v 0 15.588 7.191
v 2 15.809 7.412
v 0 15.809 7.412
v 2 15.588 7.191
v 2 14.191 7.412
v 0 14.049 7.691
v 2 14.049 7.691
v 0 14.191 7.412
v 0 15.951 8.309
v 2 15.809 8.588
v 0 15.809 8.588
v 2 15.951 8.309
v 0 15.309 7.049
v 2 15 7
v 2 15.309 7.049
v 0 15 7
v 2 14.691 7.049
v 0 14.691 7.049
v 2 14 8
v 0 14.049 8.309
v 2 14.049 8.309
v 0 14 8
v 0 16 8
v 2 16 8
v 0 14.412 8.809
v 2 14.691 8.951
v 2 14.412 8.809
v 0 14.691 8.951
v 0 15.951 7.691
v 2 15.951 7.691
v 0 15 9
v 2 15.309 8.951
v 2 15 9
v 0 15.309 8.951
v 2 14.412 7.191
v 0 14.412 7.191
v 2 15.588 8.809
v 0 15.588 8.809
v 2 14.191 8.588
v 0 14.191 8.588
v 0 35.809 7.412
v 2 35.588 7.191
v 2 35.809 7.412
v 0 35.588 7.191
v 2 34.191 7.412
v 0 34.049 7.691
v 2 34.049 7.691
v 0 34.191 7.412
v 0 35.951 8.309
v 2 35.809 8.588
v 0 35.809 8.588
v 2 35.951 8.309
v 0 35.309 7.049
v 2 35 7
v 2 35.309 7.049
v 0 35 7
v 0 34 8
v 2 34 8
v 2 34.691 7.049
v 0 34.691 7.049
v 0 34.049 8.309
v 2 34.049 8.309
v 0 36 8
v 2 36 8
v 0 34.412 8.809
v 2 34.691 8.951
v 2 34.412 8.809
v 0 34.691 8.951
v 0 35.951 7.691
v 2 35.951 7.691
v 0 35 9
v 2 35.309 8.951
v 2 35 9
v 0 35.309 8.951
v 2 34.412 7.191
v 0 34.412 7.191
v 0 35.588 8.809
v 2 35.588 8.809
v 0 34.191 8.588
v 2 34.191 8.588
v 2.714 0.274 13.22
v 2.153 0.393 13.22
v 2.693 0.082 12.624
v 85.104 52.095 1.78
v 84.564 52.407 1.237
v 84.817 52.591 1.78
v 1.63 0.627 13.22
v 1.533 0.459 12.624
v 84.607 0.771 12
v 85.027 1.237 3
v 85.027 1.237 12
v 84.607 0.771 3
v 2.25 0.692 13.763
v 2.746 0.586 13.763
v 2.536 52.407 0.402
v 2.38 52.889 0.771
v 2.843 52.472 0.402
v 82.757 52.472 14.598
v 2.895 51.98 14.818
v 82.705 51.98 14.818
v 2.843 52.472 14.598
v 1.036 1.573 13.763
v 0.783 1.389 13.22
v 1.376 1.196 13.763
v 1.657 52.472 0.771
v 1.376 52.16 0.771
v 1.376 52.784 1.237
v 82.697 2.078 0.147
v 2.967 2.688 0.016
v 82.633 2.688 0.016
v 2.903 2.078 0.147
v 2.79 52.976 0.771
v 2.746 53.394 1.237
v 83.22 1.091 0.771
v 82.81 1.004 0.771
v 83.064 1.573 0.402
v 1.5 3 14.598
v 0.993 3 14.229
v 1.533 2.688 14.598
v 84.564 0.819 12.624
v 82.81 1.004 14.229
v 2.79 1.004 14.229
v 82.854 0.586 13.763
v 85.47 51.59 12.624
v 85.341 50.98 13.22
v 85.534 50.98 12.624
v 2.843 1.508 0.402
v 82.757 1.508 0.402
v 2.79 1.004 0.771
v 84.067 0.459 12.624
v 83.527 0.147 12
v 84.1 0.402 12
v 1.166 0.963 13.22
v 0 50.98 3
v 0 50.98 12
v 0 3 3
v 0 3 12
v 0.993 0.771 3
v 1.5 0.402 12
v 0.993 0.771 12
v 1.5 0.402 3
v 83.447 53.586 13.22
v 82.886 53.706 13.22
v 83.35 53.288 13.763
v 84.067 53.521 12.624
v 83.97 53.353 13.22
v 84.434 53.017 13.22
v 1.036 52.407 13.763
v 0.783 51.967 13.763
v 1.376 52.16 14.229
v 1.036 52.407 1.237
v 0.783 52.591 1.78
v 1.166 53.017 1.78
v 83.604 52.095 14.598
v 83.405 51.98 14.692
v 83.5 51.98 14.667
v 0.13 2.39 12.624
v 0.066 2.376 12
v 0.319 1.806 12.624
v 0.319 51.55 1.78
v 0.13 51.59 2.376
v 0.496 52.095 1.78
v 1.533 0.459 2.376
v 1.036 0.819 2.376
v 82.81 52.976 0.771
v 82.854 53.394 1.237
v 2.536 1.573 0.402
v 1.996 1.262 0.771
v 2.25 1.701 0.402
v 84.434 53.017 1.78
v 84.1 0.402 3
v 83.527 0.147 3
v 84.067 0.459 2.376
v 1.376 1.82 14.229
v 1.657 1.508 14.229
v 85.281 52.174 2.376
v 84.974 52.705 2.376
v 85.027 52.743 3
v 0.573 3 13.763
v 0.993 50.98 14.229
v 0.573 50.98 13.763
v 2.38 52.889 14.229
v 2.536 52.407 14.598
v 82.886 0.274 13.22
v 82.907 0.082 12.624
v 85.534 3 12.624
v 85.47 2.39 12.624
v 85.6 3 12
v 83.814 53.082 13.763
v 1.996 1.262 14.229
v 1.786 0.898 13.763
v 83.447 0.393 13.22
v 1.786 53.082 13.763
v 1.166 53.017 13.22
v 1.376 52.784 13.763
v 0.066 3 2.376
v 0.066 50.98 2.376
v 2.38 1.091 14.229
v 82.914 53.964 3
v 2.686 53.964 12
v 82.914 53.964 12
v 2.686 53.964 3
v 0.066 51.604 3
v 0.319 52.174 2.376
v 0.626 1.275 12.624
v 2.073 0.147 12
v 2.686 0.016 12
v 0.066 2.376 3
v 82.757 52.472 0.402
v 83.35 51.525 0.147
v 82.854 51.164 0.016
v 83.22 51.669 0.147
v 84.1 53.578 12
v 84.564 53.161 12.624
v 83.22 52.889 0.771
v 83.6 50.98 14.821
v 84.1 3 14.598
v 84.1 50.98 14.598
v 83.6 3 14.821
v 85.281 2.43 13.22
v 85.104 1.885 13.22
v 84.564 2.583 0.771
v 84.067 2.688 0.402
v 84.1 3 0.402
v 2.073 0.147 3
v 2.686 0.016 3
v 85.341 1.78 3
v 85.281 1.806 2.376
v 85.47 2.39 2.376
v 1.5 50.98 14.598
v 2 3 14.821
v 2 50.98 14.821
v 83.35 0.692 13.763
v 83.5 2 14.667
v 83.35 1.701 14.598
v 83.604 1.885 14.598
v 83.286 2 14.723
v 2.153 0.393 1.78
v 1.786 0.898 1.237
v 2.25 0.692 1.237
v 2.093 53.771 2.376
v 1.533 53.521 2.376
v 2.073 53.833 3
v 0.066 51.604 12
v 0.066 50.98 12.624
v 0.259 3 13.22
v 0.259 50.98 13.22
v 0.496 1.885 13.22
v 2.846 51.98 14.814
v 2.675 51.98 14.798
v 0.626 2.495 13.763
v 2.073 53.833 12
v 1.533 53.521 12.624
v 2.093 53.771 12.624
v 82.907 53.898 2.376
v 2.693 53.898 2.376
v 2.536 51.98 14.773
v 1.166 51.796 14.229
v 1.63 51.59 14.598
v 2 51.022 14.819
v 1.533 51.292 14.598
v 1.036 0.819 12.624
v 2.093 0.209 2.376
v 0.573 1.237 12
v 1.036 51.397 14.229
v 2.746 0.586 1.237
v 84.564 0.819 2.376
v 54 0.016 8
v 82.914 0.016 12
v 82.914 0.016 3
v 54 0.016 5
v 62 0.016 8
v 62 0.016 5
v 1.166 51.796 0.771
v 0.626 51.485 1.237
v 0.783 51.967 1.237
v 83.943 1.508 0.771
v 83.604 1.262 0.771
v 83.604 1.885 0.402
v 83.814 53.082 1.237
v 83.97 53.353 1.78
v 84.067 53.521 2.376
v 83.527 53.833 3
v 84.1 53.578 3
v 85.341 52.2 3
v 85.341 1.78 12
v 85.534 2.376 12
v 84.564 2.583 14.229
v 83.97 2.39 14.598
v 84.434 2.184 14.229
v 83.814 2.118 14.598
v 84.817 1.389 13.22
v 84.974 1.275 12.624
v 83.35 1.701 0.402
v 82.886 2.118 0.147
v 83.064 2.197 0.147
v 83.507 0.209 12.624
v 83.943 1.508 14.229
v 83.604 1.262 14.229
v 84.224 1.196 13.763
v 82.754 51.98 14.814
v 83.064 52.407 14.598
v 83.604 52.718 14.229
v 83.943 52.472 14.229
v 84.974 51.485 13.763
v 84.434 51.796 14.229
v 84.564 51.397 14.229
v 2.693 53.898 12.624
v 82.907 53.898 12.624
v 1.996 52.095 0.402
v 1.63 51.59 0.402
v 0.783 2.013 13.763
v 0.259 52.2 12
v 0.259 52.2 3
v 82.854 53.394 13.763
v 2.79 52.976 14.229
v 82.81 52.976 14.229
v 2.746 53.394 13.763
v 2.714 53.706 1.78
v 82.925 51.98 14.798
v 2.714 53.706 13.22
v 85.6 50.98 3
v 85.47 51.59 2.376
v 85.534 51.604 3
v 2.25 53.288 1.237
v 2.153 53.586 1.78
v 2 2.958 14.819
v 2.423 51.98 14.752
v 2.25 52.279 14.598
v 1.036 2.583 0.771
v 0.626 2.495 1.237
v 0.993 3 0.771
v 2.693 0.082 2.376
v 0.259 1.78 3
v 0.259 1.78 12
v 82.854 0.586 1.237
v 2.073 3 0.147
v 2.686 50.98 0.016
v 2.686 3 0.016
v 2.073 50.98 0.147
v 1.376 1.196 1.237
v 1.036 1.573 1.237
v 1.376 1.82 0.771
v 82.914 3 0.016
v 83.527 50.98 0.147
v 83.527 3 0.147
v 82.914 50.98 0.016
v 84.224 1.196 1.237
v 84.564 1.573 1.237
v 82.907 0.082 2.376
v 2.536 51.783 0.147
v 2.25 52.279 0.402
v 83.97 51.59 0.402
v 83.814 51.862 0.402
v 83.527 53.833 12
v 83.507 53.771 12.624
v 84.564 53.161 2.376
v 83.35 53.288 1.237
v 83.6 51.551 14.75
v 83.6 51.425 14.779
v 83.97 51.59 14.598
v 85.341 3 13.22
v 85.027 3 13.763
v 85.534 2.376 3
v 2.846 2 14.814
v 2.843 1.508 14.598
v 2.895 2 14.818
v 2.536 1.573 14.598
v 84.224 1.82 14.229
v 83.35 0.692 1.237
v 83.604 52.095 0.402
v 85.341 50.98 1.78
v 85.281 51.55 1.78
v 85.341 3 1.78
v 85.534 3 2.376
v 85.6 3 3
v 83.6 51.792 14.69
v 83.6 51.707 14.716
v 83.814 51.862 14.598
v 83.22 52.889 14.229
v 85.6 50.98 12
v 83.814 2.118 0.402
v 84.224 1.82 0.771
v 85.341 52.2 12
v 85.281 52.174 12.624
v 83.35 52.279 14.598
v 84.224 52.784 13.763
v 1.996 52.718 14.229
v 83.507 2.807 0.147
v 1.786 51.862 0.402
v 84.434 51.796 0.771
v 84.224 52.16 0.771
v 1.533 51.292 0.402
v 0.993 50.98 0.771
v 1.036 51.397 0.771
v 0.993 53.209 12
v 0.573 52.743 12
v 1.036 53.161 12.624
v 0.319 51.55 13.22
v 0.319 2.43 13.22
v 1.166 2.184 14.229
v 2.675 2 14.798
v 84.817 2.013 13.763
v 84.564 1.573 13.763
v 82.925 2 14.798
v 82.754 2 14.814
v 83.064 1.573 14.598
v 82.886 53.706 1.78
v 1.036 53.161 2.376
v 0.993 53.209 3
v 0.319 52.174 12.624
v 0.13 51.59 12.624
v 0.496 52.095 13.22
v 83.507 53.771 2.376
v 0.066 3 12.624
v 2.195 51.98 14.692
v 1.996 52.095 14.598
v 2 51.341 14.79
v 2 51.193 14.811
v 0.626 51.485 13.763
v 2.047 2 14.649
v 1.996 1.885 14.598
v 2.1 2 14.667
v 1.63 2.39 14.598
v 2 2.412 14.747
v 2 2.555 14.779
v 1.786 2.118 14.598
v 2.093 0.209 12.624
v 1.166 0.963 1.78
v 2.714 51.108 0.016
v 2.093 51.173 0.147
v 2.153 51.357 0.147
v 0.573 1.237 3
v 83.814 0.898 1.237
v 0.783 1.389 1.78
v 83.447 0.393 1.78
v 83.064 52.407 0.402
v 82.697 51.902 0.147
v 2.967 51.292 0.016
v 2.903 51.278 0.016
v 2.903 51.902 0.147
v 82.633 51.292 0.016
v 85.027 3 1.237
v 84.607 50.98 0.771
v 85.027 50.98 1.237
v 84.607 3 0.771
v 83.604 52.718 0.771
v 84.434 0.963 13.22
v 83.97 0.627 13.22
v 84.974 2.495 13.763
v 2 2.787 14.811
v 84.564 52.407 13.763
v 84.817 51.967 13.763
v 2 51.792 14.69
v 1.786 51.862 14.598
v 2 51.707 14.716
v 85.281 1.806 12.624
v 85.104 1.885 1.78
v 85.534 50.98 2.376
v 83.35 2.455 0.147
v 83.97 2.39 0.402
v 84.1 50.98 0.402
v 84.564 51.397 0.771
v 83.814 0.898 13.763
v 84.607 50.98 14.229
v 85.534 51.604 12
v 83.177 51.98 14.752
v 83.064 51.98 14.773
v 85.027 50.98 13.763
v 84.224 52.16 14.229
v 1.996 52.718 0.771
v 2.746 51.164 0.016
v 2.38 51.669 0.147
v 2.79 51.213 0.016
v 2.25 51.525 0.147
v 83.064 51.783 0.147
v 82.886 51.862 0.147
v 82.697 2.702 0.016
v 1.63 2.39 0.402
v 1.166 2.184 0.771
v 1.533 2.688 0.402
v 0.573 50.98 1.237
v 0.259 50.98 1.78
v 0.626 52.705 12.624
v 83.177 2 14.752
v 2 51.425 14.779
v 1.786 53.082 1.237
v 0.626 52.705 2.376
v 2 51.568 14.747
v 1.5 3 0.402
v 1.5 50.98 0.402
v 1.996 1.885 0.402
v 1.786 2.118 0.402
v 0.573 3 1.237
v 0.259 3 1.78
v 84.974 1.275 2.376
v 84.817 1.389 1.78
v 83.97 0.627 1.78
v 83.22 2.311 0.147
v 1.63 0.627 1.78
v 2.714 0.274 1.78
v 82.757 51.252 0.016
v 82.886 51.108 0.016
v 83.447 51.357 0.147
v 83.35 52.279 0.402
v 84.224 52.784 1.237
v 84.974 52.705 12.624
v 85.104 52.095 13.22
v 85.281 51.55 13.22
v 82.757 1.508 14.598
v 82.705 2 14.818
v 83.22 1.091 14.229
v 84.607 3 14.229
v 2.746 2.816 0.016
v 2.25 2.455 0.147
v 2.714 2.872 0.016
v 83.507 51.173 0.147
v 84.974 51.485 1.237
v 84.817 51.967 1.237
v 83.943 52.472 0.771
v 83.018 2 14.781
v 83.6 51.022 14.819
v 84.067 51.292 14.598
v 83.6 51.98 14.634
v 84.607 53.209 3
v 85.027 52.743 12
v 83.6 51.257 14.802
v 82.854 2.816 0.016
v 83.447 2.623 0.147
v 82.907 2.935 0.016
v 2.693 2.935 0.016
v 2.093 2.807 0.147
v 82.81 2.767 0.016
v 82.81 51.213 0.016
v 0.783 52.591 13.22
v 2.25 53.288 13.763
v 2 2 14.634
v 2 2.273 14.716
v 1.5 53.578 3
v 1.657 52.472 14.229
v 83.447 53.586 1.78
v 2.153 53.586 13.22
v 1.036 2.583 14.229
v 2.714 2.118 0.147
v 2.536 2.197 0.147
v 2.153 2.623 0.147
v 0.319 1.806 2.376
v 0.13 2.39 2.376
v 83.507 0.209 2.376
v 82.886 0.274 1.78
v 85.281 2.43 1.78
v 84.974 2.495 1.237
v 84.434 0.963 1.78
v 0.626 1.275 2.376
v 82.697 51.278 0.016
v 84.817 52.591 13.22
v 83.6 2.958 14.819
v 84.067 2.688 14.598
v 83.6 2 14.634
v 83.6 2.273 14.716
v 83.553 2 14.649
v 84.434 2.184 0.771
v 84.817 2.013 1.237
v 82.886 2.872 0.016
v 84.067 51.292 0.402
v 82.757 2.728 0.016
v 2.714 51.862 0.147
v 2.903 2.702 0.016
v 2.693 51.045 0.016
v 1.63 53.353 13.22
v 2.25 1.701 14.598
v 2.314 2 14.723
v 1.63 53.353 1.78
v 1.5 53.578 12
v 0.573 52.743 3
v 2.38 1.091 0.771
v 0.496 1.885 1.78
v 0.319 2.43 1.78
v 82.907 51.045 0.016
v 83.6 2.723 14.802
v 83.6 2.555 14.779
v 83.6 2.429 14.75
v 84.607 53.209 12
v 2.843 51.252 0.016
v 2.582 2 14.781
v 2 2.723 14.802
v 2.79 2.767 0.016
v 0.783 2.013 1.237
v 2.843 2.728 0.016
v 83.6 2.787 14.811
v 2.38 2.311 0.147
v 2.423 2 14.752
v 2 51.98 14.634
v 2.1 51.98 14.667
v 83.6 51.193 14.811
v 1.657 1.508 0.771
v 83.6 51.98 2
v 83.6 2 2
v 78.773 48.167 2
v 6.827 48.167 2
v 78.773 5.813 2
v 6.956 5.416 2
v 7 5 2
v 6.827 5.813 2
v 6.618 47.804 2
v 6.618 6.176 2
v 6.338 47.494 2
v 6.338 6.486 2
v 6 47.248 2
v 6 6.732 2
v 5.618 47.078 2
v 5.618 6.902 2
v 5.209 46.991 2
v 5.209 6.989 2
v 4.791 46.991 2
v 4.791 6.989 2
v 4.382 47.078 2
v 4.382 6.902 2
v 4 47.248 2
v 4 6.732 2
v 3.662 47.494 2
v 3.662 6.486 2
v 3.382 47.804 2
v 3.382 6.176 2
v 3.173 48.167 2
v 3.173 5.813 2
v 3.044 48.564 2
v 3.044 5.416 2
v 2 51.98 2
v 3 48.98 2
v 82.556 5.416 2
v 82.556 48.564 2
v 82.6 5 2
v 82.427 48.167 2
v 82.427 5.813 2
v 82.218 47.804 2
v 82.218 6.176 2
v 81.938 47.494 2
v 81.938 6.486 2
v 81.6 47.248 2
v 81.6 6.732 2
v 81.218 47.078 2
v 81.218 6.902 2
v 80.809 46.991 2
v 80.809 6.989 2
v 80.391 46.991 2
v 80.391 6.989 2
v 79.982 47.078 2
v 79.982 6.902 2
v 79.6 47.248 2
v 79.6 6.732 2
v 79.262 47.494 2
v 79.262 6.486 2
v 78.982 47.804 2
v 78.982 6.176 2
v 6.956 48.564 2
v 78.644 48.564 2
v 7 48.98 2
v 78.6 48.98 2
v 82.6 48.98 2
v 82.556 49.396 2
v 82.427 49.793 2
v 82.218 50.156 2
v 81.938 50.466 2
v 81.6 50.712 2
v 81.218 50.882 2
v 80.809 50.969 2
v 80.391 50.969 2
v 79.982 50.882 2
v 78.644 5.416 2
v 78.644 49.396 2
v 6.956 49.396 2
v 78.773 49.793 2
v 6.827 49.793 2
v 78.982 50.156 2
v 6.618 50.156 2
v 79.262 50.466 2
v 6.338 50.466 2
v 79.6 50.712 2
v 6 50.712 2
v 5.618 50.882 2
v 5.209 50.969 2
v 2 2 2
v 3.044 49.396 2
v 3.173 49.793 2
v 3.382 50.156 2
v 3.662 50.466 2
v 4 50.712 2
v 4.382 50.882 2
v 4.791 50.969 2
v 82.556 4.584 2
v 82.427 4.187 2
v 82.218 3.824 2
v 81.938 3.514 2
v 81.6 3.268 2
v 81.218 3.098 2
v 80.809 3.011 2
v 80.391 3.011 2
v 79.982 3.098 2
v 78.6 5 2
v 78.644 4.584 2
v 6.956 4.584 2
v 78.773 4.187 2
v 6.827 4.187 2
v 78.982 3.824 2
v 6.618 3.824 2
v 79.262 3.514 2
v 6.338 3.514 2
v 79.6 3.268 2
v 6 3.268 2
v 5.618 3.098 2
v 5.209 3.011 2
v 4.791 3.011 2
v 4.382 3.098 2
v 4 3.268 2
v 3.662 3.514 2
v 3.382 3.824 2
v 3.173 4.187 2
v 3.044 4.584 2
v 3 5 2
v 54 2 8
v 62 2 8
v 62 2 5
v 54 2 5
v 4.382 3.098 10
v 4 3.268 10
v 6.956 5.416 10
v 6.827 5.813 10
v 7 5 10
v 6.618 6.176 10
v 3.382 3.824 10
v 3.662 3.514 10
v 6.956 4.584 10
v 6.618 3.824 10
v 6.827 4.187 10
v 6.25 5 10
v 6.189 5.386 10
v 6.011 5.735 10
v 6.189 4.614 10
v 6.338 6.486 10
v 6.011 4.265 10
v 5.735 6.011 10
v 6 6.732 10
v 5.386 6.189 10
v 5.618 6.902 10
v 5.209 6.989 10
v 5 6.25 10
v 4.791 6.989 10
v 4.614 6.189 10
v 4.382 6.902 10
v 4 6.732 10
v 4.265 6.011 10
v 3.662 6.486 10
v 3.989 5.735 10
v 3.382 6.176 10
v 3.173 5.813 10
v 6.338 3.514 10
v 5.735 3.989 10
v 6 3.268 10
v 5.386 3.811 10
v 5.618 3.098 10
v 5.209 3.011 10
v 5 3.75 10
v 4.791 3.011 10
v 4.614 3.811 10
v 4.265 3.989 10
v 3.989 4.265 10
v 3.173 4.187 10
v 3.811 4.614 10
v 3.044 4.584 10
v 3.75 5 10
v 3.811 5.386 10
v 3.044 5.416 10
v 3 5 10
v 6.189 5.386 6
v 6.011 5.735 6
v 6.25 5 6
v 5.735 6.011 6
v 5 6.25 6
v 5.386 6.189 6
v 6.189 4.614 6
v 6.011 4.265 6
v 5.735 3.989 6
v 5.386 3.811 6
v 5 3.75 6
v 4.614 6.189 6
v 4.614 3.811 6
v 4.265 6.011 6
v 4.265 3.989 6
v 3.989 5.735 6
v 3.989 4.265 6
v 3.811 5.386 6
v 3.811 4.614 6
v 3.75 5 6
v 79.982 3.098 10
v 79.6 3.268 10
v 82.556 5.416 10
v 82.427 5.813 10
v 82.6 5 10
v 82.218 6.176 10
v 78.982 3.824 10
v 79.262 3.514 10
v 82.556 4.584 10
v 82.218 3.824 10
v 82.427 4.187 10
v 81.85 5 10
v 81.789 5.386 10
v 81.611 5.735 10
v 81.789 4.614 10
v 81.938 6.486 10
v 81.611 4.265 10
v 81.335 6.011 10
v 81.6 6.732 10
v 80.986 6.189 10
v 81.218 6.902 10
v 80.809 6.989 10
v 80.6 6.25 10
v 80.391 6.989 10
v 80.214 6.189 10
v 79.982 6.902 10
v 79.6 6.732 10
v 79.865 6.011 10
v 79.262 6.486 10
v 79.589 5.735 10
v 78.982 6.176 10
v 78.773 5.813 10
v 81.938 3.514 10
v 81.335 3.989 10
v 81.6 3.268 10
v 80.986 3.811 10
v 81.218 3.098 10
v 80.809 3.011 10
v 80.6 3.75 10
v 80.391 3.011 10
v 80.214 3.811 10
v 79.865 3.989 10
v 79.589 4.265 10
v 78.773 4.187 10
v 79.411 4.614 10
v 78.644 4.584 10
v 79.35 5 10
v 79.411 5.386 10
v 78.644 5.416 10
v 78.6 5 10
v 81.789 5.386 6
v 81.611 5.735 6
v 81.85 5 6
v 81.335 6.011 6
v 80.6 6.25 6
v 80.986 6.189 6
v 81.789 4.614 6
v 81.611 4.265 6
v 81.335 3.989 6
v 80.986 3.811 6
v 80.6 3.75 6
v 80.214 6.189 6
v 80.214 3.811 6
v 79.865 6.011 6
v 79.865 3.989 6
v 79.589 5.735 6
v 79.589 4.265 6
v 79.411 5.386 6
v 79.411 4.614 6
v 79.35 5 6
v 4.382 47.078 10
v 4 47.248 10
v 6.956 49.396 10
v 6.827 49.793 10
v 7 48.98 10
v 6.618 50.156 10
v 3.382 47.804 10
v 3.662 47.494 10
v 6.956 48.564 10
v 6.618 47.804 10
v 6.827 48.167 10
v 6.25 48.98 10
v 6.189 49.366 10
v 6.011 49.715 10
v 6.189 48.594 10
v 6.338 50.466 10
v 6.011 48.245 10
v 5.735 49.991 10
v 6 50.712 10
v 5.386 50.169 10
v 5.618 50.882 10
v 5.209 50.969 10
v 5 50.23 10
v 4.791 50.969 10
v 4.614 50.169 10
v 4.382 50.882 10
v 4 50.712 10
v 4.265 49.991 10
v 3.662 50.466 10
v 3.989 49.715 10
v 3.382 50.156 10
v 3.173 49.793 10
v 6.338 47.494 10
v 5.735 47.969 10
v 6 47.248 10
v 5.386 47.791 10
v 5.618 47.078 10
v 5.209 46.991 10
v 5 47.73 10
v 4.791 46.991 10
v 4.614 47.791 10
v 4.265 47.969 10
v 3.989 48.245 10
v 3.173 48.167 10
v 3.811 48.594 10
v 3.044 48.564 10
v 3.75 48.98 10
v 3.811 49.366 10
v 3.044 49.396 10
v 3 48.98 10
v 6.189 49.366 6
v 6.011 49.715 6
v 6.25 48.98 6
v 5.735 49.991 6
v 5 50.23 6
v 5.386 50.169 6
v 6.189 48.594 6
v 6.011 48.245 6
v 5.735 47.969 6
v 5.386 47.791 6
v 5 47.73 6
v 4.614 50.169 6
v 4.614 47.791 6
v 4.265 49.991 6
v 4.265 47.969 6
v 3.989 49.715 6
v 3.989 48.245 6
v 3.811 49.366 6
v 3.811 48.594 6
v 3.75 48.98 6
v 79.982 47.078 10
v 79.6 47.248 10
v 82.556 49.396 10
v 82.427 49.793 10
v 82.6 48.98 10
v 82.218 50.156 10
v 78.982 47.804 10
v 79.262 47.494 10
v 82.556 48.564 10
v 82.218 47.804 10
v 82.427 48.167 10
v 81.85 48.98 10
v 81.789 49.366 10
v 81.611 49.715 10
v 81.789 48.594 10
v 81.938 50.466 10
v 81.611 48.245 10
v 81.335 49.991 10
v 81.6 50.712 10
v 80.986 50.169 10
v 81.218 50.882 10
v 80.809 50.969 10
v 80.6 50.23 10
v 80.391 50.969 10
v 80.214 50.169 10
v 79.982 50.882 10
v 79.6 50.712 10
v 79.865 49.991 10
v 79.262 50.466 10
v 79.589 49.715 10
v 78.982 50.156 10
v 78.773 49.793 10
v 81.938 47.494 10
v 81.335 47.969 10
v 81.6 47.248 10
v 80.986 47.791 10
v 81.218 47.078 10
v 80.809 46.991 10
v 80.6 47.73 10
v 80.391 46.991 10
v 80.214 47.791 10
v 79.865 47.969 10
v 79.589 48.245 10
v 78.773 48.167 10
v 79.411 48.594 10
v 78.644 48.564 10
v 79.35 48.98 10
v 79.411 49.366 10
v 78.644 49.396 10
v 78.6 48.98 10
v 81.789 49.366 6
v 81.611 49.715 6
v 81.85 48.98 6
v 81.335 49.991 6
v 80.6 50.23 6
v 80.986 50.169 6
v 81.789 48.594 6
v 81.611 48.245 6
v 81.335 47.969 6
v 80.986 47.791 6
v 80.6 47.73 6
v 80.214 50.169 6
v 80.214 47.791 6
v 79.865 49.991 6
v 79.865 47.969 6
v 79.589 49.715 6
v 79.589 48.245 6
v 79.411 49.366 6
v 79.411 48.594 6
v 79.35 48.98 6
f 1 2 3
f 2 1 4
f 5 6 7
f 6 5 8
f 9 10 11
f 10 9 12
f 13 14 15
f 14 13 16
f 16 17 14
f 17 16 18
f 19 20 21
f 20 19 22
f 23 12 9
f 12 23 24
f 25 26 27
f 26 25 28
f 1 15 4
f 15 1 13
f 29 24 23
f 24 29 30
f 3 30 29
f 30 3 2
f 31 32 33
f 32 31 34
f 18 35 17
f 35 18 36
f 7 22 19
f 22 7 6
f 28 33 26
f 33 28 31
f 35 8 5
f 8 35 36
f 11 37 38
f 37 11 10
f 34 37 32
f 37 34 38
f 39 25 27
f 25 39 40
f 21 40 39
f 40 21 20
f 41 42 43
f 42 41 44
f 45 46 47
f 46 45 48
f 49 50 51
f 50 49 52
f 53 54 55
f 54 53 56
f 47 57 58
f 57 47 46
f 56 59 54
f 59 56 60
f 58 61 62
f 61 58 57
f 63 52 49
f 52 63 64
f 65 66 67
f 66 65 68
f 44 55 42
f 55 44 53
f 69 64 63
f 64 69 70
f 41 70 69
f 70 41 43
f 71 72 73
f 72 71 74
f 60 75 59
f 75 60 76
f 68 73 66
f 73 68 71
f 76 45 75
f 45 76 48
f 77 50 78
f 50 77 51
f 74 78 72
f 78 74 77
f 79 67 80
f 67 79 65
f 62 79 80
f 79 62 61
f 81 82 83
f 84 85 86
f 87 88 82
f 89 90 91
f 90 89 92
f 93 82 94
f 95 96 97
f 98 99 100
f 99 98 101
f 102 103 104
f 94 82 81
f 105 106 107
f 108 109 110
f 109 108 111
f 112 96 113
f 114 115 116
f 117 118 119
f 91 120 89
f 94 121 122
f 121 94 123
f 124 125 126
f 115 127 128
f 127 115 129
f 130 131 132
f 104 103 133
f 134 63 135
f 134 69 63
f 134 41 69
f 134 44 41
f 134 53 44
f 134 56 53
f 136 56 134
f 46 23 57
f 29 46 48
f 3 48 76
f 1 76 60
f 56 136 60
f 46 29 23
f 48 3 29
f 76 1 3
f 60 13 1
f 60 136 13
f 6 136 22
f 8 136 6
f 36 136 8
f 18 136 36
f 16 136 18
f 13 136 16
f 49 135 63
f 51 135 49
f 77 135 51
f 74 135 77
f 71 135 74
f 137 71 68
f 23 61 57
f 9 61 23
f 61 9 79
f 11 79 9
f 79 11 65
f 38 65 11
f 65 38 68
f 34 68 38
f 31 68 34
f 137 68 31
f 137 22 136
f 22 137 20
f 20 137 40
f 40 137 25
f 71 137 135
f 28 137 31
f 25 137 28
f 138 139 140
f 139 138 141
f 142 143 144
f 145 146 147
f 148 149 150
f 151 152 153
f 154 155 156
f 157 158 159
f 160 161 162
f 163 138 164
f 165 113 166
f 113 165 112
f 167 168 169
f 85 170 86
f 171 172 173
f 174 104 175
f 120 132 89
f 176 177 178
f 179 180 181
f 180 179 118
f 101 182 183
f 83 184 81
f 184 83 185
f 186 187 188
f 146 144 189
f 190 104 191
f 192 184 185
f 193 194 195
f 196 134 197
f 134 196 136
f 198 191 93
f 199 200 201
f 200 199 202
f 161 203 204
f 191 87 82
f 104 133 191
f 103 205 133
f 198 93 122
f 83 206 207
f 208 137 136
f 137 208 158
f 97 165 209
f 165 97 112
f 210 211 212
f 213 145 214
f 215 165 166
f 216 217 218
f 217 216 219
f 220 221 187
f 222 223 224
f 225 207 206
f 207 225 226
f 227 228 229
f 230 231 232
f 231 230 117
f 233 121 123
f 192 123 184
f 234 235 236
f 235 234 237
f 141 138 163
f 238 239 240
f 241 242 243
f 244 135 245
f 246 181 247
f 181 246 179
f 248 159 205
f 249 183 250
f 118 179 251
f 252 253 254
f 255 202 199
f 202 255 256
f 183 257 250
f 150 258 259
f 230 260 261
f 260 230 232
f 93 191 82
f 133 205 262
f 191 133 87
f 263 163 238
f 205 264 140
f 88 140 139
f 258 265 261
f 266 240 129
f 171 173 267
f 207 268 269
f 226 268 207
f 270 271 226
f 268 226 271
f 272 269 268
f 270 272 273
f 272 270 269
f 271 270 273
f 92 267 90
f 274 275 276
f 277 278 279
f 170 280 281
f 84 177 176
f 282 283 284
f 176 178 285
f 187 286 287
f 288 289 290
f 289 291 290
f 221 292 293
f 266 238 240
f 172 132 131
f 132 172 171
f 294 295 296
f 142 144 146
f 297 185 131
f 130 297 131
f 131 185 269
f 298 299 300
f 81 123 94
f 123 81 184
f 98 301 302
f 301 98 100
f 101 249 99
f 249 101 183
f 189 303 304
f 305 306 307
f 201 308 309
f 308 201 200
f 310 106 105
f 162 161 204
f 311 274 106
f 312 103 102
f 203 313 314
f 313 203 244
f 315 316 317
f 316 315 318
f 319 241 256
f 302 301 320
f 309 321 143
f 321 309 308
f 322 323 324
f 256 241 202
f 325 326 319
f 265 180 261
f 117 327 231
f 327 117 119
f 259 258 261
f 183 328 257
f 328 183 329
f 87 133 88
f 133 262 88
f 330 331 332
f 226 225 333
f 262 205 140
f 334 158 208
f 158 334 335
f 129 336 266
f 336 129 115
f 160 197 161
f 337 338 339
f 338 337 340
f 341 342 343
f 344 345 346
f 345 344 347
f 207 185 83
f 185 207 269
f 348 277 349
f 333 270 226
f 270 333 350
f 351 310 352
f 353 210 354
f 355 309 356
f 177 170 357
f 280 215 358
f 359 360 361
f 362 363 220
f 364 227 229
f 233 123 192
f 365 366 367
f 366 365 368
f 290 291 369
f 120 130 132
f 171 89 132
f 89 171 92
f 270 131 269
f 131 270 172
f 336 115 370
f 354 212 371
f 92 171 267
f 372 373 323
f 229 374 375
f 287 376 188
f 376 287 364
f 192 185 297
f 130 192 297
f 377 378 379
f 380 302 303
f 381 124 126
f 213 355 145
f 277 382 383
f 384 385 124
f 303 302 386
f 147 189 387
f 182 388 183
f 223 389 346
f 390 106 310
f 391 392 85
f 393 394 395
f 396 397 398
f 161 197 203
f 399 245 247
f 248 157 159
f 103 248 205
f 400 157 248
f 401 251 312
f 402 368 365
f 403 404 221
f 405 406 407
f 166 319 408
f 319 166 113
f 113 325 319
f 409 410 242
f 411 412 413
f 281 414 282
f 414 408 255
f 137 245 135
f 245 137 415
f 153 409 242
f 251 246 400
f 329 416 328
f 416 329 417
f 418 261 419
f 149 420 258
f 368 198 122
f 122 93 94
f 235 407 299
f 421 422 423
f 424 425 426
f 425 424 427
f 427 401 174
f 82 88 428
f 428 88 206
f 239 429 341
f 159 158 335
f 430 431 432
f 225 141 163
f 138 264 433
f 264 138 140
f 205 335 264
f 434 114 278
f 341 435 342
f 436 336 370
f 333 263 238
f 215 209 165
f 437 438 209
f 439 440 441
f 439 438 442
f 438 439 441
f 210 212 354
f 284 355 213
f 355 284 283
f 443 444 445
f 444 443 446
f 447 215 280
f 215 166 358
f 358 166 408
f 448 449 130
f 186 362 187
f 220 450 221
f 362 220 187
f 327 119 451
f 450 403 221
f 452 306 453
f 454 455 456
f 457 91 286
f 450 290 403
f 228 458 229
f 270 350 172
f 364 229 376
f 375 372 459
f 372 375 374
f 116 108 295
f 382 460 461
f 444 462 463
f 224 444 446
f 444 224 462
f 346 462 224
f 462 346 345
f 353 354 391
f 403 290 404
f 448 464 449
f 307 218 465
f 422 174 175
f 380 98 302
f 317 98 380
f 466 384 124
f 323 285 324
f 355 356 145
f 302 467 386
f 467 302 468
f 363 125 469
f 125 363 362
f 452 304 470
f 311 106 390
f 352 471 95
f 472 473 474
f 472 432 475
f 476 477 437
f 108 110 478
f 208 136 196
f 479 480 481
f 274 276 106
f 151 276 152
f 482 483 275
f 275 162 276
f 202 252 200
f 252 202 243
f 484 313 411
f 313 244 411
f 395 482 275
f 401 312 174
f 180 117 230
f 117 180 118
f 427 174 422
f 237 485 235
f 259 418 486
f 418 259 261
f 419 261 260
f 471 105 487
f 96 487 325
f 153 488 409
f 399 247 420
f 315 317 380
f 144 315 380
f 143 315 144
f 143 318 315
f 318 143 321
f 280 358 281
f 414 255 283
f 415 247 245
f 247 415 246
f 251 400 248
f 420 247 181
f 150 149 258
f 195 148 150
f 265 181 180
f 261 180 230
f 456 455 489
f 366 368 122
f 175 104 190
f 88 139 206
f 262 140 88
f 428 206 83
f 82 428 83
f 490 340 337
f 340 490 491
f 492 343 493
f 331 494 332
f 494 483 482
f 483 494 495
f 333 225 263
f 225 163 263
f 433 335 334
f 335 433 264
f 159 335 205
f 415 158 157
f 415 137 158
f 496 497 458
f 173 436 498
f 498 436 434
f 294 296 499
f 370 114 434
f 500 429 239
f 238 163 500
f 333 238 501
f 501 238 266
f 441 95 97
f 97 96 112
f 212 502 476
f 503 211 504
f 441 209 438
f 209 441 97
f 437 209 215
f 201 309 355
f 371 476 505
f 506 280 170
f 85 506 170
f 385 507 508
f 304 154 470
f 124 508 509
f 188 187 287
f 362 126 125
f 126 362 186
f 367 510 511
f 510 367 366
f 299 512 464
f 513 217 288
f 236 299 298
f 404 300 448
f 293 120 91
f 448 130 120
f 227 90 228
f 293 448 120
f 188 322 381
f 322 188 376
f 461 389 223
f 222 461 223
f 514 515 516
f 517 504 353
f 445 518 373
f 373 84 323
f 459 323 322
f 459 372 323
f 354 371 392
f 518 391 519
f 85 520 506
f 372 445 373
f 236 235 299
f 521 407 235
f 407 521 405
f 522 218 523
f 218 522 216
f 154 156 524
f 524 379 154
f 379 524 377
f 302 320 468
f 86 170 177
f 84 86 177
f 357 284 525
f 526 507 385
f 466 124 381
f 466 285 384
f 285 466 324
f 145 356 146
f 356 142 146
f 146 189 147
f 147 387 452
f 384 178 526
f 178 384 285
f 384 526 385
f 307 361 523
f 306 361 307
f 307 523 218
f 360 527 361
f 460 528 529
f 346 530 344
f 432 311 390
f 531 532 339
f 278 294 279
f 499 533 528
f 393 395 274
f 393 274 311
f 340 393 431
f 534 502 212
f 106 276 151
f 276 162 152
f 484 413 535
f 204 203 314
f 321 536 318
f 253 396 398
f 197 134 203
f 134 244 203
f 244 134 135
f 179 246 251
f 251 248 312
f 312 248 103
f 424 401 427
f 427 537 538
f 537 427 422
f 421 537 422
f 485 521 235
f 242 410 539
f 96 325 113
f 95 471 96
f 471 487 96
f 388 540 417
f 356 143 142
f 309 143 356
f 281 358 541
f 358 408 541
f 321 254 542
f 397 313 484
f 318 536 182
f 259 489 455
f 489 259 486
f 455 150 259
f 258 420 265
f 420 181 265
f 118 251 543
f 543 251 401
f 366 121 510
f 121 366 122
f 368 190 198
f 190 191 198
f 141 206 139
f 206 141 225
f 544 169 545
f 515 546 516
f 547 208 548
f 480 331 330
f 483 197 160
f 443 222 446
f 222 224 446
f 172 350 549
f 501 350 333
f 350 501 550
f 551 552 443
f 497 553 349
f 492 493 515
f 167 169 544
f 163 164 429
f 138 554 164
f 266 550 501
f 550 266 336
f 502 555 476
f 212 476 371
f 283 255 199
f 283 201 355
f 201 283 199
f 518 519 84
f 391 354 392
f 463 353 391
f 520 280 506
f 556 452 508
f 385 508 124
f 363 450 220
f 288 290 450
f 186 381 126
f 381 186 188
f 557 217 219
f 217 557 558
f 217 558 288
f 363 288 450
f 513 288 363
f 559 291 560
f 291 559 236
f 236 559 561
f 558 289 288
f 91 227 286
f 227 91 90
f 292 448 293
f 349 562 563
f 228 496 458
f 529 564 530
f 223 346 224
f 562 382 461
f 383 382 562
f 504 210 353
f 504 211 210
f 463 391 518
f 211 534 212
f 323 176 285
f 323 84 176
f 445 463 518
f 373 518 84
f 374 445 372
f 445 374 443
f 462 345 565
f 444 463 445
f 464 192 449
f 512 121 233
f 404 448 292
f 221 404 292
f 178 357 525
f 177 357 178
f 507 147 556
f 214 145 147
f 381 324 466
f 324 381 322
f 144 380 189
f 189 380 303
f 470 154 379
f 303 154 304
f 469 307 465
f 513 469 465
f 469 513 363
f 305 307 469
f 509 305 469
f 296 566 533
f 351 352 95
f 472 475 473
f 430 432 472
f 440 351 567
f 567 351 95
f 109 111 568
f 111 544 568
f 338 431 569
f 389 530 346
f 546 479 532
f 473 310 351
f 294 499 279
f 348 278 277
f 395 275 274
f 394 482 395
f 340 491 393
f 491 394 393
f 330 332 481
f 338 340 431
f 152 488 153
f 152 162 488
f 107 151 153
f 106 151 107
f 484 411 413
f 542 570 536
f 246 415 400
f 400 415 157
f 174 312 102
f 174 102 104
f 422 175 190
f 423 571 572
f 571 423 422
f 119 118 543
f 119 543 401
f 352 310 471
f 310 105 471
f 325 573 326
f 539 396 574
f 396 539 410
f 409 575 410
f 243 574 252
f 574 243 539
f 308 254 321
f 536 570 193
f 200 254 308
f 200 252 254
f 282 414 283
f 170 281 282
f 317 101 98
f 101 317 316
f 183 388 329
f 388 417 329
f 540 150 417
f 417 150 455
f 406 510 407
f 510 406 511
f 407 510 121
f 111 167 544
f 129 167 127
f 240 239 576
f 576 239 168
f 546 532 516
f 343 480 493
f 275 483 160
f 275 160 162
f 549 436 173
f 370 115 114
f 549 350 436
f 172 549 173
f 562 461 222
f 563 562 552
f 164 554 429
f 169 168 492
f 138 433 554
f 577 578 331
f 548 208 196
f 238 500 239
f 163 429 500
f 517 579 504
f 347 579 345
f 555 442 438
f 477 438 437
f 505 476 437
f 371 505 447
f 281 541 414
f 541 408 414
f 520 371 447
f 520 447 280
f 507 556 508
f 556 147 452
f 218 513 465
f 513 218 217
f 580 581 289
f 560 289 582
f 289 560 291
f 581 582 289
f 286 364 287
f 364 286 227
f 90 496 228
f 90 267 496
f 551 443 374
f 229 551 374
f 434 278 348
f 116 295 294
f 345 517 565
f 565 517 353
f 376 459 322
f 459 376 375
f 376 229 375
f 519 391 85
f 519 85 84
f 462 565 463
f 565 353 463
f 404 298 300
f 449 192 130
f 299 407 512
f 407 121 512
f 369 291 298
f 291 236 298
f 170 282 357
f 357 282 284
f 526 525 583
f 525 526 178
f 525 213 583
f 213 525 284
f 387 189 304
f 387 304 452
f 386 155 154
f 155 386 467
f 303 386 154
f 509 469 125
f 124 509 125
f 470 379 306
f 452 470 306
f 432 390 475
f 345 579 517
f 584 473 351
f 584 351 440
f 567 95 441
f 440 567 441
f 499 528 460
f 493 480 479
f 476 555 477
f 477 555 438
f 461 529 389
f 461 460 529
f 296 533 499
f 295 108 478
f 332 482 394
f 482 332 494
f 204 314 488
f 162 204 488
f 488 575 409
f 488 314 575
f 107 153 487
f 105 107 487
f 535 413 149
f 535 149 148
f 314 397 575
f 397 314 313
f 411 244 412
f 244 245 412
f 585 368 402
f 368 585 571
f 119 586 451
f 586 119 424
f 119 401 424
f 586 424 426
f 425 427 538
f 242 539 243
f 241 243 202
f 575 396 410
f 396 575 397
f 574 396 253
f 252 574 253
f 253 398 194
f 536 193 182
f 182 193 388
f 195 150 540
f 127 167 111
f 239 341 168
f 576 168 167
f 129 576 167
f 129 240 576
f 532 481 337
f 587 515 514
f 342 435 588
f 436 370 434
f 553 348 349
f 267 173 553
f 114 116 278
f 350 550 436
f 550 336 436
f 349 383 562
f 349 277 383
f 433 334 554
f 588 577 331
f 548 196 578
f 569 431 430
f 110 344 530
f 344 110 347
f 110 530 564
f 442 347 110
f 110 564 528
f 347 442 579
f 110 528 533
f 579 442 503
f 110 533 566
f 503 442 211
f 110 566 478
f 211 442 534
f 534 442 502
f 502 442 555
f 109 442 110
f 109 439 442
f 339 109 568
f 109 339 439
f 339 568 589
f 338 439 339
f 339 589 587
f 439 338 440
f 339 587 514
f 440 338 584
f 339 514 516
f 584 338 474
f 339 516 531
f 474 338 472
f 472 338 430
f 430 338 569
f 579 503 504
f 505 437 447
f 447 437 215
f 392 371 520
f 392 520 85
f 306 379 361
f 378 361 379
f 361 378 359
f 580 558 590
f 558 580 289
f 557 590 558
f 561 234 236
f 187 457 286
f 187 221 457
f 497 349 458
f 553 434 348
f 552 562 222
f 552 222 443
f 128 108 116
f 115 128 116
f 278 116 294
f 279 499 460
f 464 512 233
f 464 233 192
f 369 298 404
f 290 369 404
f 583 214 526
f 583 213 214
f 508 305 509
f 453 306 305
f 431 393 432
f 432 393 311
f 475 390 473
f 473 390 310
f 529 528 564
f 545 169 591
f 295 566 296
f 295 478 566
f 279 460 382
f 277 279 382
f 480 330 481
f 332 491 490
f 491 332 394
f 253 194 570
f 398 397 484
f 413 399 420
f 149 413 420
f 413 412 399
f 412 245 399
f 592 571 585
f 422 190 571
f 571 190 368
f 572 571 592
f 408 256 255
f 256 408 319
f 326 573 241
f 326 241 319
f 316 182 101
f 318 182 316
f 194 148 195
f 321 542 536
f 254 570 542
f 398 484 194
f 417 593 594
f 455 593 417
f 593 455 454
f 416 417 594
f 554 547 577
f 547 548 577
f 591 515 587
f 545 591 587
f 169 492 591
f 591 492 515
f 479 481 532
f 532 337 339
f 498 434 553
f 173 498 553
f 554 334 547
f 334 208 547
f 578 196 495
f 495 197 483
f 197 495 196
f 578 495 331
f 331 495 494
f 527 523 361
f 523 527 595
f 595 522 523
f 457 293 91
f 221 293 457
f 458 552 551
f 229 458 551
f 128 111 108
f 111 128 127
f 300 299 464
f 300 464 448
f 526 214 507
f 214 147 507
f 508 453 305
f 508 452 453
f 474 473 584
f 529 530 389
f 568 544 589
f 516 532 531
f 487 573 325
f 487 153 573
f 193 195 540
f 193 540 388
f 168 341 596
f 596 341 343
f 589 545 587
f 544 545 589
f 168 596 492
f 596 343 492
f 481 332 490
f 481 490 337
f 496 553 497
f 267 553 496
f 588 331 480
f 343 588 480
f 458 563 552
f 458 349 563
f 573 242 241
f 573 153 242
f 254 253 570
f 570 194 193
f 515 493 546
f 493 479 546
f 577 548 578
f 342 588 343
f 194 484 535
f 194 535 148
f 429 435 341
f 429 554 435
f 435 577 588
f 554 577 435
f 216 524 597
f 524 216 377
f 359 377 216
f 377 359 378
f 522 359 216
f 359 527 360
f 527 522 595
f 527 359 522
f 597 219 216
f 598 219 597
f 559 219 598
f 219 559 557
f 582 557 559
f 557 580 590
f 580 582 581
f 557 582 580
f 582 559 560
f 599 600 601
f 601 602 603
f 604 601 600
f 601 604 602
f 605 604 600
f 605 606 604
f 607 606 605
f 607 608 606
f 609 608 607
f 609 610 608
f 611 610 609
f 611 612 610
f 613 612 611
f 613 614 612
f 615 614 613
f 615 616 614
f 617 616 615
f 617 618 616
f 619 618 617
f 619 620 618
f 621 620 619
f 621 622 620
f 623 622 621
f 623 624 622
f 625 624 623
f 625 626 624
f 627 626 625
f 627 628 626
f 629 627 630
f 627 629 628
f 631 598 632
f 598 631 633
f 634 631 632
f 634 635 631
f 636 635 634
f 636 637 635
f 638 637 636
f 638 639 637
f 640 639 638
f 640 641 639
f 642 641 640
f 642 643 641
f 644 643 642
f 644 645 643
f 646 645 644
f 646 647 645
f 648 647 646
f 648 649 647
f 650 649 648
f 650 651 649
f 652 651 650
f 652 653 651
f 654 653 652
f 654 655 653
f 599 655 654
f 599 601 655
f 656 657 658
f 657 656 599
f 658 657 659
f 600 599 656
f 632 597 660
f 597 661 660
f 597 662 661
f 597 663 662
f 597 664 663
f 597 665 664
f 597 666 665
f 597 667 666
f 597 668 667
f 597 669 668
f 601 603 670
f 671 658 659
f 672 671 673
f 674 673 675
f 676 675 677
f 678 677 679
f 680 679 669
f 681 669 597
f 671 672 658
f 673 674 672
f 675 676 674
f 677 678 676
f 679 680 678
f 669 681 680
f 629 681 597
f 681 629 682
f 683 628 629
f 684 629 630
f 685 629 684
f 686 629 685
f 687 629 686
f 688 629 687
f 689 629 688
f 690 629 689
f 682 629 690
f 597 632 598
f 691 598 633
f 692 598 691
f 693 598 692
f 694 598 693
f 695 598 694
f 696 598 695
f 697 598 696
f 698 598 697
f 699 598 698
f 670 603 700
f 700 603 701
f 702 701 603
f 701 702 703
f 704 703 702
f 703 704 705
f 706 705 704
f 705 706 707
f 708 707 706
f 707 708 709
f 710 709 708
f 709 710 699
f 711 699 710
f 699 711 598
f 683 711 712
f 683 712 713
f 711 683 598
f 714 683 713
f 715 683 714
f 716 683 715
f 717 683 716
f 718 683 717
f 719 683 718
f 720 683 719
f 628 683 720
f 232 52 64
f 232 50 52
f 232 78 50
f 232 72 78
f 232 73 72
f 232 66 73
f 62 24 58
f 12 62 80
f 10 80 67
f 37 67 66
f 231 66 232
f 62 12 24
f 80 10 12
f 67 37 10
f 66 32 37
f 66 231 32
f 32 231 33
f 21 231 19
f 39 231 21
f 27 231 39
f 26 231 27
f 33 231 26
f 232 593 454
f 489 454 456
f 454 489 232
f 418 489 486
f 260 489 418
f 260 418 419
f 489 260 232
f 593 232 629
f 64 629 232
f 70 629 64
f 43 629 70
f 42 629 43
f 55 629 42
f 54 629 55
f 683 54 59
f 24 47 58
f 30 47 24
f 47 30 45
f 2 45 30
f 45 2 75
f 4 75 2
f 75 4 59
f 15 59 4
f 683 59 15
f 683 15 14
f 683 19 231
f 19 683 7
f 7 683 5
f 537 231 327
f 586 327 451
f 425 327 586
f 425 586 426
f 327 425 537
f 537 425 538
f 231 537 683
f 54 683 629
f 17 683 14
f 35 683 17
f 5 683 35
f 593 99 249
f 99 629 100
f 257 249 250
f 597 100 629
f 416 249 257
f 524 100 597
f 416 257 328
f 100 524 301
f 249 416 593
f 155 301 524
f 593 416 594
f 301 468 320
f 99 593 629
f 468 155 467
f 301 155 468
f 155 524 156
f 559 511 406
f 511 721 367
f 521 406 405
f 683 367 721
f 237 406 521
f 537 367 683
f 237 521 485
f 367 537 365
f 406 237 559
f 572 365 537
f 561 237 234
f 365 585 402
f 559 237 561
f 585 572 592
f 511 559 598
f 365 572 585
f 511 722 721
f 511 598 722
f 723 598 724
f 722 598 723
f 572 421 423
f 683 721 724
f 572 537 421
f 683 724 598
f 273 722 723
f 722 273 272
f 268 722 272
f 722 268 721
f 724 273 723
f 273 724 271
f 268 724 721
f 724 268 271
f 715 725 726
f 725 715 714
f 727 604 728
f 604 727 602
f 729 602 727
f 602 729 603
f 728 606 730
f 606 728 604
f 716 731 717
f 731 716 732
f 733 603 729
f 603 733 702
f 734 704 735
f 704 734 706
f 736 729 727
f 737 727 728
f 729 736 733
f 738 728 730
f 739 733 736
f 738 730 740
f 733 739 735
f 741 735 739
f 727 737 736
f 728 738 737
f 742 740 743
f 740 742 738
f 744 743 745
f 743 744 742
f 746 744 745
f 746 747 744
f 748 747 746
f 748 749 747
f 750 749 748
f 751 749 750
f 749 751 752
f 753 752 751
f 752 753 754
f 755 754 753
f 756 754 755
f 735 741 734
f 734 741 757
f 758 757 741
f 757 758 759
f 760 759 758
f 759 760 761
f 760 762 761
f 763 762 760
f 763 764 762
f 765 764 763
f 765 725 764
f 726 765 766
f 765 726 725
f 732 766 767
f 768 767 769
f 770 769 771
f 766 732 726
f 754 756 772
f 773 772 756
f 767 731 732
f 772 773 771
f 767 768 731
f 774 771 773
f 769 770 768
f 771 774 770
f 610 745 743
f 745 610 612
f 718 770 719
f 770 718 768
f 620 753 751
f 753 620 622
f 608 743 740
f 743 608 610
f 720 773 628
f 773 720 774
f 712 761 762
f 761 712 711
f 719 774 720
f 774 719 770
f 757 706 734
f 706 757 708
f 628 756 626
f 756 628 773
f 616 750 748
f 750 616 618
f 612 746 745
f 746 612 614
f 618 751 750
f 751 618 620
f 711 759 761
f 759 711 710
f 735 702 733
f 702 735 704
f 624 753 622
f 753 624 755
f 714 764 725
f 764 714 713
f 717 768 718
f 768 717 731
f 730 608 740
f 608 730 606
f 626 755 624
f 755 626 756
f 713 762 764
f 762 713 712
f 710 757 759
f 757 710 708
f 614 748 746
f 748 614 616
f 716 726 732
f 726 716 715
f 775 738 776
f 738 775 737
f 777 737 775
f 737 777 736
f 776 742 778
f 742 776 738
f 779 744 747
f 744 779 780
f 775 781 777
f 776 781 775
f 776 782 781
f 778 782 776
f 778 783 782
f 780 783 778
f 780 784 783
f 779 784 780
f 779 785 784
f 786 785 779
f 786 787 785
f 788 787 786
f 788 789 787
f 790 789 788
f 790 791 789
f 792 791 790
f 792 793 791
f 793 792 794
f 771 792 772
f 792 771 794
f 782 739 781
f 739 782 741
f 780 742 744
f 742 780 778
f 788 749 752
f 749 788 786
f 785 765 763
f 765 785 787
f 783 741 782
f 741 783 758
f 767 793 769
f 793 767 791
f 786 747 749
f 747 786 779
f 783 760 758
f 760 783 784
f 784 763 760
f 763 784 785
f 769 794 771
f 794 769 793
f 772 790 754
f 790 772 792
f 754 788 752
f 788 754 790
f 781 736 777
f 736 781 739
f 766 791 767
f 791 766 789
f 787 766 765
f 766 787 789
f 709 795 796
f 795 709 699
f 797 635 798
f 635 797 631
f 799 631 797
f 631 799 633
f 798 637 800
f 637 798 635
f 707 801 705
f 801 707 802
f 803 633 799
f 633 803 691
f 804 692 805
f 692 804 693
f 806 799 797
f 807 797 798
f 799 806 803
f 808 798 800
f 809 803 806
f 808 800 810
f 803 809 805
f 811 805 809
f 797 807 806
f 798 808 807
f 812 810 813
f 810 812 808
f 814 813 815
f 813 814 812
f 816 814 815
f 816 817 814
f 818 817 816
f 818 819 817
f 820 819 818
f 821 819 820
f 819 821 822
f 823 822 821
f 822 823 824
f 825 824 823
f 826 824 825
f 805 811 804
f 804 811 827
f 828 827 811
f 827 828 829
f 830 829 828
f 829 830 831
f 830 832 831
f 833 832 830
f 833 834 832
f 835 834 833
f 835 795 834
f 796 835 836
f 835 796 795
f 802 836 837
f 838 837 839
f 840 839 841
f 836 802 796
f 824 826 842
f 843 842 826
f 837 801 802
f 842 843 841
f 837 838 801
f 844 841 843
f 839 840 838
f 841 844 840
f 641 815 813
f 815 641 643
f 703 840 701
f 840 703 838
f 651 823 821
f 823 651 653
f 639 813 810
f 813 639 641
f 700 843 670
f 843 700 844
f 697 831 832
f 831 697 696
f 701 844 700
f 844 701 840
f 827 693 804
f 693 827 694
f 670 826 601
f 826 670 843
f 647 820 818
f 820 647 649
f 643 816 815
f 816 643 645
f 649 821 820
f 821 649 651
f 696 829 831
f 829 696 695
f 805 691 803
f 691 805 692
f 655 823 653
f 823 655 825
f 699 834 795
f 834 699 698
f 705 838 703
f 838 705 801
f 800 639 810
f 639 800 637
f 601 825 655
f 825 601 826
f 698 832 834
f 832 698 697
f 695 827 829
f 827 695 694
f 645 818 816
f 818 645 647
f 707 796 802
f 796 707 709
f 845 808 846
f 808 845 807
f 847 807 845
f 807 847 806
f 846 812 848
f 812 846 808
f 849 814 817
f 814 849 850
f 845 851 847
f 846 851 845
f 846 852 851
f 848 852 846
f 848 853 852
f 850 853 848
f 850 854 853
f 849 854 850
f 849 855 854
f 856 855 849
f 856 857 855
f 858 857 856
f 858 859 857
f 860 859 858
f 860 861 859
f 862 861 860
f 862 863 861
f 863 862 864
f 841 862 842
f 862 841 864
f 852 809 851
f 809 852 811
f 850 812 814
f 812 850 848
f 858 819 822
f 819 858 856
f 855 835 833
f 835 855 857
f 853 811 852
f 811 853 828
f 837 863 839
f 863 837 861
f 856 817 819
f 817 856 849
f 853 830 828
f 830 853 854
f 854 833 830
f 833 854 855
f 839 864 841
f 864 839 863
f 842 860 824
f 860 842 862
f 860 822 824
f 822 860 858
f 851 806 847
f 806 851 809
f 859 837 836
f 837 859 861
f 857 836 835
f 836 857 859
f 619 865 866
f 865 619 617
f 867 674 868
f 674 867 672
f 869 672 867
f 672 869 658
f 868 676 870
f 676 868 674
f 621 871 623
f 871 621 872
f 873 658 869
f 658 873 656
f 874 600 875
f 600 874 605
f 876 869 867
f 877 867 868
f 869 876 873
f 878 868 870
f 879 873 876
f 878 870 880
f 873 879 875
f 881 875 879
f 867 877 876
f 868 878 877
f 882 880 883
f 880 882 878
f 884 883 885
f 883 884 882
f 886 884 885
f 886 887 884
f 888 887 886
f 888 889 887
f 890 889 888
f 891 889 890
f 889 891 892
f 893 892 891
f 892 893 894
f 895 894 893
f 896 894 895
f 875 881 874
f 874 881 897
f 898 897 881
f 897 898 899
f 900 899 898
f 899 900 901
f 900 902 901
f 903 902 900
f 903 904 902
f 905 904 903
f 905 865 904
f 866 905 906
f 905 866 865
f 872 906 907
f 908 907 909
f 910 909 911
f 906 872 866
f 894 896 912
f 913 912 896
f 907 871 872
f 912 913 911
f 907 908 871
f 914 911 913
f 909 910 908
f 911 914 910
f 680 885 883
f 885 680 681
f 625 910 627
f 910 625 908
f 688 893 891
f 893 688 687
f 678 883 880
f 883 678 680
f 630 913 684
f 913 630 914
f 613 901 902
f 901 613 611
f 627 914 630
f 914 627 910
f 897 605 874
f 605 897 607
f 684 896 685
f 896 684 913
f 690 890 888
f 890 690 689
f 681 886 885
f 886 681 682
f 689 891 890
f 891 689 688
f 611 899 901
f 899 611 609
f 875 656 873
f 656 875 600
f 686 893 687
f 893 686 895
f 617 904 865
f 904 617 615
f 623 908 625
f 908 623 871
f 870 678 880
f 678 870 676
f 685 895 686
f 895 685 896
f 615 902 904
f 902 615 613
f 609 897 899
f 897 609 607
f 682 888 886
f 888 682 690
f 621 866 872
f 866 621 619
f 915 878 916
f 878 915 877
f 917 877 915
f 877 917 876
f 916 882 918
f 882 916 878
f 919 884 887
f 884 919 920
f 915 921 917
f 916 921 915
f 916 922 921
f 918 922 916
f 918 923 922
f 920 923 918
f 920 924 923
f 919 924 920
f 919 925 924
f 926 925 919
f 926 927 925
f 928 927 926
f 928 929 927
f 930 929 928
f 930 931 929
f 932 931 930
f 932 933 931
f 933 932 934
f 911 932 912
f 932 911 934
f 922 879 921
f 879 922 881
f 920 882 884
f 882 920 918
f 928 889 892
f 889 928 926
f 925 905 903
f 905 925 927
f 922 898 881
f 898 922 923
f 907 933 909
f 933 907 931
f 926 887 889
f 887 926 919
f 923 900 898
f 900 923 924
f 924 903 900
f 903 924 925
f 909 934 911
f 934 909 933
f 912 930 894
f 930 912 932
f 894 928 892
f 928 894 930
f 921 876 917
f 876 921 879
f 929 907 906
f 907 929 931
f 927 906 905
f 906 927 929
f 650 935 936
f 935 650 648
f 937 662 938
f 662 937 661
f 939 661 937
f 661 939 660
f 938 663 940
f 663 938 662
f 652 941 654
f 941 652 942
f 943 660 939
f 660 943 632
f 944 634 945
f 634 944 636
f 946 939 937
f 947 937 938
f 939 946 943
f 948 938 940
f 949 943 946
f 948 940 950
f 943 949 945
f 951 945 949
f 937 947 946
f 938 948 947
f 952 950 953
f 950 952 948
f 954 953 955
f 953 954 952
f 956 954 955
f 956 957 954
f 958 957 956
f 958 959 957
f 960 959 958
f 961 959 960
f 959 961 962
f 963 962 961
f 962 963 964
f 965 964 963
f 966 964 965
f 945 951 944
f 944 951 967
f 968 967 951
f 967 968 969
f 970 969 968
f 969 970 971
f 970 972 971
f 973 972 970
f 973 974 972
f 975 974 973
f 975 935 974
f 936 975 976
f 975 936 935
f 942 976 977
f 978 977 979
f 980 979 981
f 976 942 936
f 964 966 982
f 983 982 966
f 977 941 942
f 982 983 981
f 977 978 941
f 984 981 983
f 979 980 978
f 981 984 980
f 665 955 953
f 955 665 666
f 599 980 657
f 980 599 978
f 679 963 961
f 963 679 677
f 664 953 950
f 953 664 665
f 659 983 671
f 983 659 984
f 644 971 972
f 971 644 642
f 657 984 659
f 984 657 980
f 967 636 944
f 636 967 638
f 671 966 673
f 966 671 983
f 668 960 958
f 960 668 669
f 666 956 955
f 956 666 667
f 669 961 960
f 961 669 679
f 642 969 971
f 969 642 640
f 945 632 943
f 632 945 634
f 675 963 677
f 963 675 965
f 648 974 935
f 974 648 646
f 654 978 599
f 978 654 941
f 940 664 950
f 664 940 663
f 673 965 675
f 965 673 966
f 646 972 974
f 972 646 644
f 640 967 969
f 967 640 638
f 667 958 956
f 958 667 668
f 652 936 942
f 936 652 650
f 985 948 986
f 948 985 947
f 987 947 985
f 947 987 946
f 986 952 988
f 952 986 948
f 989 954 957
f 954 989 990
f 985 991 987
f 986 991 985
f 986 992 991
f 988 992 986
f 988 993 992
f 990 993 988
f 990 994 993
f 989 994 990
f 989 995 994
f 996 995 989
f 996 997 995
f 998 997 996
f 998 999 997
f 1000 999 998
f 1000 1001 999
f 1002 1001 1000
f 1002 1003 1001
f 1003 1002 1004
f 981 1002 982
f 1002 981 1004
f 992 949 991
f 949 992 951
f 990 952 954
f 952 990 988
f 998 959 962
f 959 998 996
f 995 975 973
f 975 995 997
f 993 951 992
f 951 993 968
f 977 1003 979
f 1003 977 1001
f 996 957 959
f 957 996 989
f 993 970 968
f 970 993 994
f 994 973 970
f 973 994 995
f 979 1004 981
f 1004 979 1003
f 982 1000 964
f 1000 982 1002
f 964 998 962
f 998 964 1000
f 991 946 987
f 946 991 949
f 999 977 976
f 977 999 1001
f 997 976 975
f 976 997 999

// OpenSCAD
// ============================================
// PwnZero 外壳 3D 模型 - 完整版
// ============================================
// 信用卡尺寸便携黑客工具外壳
// 尺寸: 85.6mm x 53.98mm x 25mm

// ============================================
// 全局参数
// ============================================

// 外壳尺寸
case_length = 85.6;
case_width = 53.98;
case_height = 25;
wall_thickness = 2;
corner_radius = 3;

// 分层高度
bottom_height = 15;  // 底壳高度
top_height = 10;     // 顶盖高度

// OLED 开孔 (顶层)
oled_x = 15;
oled_y = 8;
oled_width = 32;
oled_height = 16;

// 五向摇杆开孔 (顶层)
joystick_x = 60;
joystick_y = case_width / 2;
joystick_diameter = 12;

// LED 开孔 (顶层右侧)
led_x = 78;
led_y_positions = [5, 13, 21];  // 红、黄、绿
led_diameter = 5.5;

// USB 开孔 (侧面)
usb_x = 54;
usb_width = 8;
usb_height = 3;

// 天线孔 (侧面)
antenna_x = 10;
antenna_diameter = 2;

// 安装柱位置 (4个角)
mount_positions = [
    [5, 5],
    [case_length - 5, 5],
    [5, case_width - 5],
    [case_length - 5, case_width - 5]
];
mount_diameter = 4;
mount_screw_diameter = 2.5;

// ============================================
// 基础模块
// ============================================

// 圆角立方体
module rounded_cube(size, radius) {
    hull() {
        for (x = [radius, size[0] - radius])
            for (y = [radius, size[1] - radius])
                for (z = [radius, size[2] - radius])
                    translate([x, y, z])
                        sphere(r = radius, $fn = 30);
    }
}

// ============================================
// 底壳模块
// ============================================
module bottom_case() {
    difference() {
        // 外壳主体
        rounded_cube([case_length, case_width, bottom_height], corner_radius);
        
        // 内部挖空
        translate([wall_thickness, wall_thickness, wall_thickness])
            cube([
                case_length - wall_thickness * 2,
                case_width - wall_thickness * 2,
                bottom_height
            ]);
        
        // USB 开孔 (短边侧面)
        translate([usb_x, -1, 5])
            cube([usb_width, wall_thickness + 2, usb_height]);
        
        // 天线孔 x2 (长边侧面)
        for (y_pos = [15, 35])
            translate([-1, y_pos, 8])
                rotate([0, 90, 0])
                    cylinder(h = wall_thickness + 2, d = antenna_diameter, $fn = 20);
    }
    
    // 安装柱
    for (pos = mount_positions) {
        translate([pos[0], pos[1], wall_thickness])
            difference() {
                cylinder(h = 8, d = mount_diameter, $fn = 30);
                translate([0, 0, 4])
                    cylinder(h = 5, d = mount_screw_diameter, $fn = 20);
            }
    }
}


// ============================================
// 顶盖模块
// ============================================
module top_case() {
    difference() {
        // 顶盖主体
        rounded_cube([case_length, case_width, top_height], corner_radius);
        
        // 内部挖空
        translate([wall_thickness, wall_thickness, -1])
            cube([
                case_length - wall_thickness * 2,
                case_width - wall_thickness * 2,
                top_height - wall_thickness + 1
            ]);
        
        // OLED 显示屏开孔
        translate([oled_x, oled_y, -1])
            cube([oled_width, oled_height, wall_thickness + 2]);
        
        // 五向摇杆开孔
        translate([joystick_x, joystick_y, -1])
            cylinder(h = wall_thickness + 2, d = joystick_diameter, $fn = 30);
        
        // LED 开孔 x3 (红、黄、绿)
        for (y_pos = led_y_positions)
            translate([led_x, y_pos, -1])
                cylinder(h = wall_thickness + 2, d = led_diameter, $fn = 30);
    }
}


// ============================================
// 曲面透明面板模块
// ============================================
module curved_panel() {
    panel_thickness = 2;
    curve_radius = 150;
    
    difference() {
        // 曲面主体
        translate([0, 0, 0])
            intersection() {
                // 基础平板
                cube([case_length, case_width, panel_thickness]);
                
                // 曲面切割
                translate([case_length/2, case_width/2, -curve_radius + panel_thickness])
                    sphere(r = curve_radius, $fn = 100);
            }
        
        // OLED 开孔
        translate([oled_x, oled_y, -1])
            cube([oled_width, oled_height, panel_thickness + 2]);
        
        // 摇杆开孔
        translate([joystick_x, joystick_y, -1])
            cylinder(h = panel_thickness + 2, d = joystick_diameter, $fn = 30);
        
        // LED 开孔
        for (y_pos = led_y_positions)
            translate([led_x, y_pos, -1])
                cylinder(h = panel_thickness + 2, d = led_diameter, $fn = 30);
    }
}


// ============================================
// 摇杆按键帽模块
// ============================================
module joystick_cap() {
    difference() {
        // 按键帽主体 (锥形)
        cylinder(h = 8, d1 = 10, d2 = 8, $fn = 30);
        
        // 内部凹槽 (配合摇杆)
        translate([0, 0, -1])
            cylinder(h = 4, d = 6, $fn = 30);
    }
    
    // 防滑纹理
    for (angle = [0:45:315])
        rotate([0, 0, angle])
            translate([3.5, 0, 4])
                cube([0.5, 0.5, 3], center = true);
}


// ============================================
// 曲面面板模具 (用于滴胶/亚克力热弯)
// ============================================
module panel_mold() {
    mold_depth = 5;
    
    difference() {
        // 模具外框
        cube([case_length + 10, case_width + 10, mold_depth + 2]);
        
        // 曲面凹槽
        translate([5, 5, 2])
            intersection() {
                cube([case_length, case_width, mold_depth]);
                translate([case_length/2, case_width/2, -145])
                    sphere(r = 150, $fn = 100);
            }
    }
}


// ============================================
// 渲染控制
// ============================================

// 选择要渲染的部件 (取消注释对应行)

// 1. 底壳 (用于3D打印)
bottom_case();

// 2. 顶盖 (用于3D打印)
// translate([0, 60, 0]) top_case();

// 3. 曲面面板 (用于参考，实际用滴胶/亚克力制作)
// translate([0, 120, 0]) curved_panel();

// 4. 摇杆按键帽 (用于3D打印)
// translate([100, 0, 0]) joystick_cap();

// 5. 曲面面板模具 (用于滴胶浇注)
// translate([0, 180, 0]) panel_mold();

// ============================================
// 完整装配视图 (预览用)
// ============================================
/*
// 底壳
bottom_case();

// 顶盖 (分离显示)
translate([0, 0, 20])
    top_case();

// 曲面面板
translate([0, 0, 30])
    color("lightblue", 0.3)
    curved_panel();

// 摇杆帽
translate([joystick_x, joystick_y, 32])
    color("red")
    joystick_cap();
*/
